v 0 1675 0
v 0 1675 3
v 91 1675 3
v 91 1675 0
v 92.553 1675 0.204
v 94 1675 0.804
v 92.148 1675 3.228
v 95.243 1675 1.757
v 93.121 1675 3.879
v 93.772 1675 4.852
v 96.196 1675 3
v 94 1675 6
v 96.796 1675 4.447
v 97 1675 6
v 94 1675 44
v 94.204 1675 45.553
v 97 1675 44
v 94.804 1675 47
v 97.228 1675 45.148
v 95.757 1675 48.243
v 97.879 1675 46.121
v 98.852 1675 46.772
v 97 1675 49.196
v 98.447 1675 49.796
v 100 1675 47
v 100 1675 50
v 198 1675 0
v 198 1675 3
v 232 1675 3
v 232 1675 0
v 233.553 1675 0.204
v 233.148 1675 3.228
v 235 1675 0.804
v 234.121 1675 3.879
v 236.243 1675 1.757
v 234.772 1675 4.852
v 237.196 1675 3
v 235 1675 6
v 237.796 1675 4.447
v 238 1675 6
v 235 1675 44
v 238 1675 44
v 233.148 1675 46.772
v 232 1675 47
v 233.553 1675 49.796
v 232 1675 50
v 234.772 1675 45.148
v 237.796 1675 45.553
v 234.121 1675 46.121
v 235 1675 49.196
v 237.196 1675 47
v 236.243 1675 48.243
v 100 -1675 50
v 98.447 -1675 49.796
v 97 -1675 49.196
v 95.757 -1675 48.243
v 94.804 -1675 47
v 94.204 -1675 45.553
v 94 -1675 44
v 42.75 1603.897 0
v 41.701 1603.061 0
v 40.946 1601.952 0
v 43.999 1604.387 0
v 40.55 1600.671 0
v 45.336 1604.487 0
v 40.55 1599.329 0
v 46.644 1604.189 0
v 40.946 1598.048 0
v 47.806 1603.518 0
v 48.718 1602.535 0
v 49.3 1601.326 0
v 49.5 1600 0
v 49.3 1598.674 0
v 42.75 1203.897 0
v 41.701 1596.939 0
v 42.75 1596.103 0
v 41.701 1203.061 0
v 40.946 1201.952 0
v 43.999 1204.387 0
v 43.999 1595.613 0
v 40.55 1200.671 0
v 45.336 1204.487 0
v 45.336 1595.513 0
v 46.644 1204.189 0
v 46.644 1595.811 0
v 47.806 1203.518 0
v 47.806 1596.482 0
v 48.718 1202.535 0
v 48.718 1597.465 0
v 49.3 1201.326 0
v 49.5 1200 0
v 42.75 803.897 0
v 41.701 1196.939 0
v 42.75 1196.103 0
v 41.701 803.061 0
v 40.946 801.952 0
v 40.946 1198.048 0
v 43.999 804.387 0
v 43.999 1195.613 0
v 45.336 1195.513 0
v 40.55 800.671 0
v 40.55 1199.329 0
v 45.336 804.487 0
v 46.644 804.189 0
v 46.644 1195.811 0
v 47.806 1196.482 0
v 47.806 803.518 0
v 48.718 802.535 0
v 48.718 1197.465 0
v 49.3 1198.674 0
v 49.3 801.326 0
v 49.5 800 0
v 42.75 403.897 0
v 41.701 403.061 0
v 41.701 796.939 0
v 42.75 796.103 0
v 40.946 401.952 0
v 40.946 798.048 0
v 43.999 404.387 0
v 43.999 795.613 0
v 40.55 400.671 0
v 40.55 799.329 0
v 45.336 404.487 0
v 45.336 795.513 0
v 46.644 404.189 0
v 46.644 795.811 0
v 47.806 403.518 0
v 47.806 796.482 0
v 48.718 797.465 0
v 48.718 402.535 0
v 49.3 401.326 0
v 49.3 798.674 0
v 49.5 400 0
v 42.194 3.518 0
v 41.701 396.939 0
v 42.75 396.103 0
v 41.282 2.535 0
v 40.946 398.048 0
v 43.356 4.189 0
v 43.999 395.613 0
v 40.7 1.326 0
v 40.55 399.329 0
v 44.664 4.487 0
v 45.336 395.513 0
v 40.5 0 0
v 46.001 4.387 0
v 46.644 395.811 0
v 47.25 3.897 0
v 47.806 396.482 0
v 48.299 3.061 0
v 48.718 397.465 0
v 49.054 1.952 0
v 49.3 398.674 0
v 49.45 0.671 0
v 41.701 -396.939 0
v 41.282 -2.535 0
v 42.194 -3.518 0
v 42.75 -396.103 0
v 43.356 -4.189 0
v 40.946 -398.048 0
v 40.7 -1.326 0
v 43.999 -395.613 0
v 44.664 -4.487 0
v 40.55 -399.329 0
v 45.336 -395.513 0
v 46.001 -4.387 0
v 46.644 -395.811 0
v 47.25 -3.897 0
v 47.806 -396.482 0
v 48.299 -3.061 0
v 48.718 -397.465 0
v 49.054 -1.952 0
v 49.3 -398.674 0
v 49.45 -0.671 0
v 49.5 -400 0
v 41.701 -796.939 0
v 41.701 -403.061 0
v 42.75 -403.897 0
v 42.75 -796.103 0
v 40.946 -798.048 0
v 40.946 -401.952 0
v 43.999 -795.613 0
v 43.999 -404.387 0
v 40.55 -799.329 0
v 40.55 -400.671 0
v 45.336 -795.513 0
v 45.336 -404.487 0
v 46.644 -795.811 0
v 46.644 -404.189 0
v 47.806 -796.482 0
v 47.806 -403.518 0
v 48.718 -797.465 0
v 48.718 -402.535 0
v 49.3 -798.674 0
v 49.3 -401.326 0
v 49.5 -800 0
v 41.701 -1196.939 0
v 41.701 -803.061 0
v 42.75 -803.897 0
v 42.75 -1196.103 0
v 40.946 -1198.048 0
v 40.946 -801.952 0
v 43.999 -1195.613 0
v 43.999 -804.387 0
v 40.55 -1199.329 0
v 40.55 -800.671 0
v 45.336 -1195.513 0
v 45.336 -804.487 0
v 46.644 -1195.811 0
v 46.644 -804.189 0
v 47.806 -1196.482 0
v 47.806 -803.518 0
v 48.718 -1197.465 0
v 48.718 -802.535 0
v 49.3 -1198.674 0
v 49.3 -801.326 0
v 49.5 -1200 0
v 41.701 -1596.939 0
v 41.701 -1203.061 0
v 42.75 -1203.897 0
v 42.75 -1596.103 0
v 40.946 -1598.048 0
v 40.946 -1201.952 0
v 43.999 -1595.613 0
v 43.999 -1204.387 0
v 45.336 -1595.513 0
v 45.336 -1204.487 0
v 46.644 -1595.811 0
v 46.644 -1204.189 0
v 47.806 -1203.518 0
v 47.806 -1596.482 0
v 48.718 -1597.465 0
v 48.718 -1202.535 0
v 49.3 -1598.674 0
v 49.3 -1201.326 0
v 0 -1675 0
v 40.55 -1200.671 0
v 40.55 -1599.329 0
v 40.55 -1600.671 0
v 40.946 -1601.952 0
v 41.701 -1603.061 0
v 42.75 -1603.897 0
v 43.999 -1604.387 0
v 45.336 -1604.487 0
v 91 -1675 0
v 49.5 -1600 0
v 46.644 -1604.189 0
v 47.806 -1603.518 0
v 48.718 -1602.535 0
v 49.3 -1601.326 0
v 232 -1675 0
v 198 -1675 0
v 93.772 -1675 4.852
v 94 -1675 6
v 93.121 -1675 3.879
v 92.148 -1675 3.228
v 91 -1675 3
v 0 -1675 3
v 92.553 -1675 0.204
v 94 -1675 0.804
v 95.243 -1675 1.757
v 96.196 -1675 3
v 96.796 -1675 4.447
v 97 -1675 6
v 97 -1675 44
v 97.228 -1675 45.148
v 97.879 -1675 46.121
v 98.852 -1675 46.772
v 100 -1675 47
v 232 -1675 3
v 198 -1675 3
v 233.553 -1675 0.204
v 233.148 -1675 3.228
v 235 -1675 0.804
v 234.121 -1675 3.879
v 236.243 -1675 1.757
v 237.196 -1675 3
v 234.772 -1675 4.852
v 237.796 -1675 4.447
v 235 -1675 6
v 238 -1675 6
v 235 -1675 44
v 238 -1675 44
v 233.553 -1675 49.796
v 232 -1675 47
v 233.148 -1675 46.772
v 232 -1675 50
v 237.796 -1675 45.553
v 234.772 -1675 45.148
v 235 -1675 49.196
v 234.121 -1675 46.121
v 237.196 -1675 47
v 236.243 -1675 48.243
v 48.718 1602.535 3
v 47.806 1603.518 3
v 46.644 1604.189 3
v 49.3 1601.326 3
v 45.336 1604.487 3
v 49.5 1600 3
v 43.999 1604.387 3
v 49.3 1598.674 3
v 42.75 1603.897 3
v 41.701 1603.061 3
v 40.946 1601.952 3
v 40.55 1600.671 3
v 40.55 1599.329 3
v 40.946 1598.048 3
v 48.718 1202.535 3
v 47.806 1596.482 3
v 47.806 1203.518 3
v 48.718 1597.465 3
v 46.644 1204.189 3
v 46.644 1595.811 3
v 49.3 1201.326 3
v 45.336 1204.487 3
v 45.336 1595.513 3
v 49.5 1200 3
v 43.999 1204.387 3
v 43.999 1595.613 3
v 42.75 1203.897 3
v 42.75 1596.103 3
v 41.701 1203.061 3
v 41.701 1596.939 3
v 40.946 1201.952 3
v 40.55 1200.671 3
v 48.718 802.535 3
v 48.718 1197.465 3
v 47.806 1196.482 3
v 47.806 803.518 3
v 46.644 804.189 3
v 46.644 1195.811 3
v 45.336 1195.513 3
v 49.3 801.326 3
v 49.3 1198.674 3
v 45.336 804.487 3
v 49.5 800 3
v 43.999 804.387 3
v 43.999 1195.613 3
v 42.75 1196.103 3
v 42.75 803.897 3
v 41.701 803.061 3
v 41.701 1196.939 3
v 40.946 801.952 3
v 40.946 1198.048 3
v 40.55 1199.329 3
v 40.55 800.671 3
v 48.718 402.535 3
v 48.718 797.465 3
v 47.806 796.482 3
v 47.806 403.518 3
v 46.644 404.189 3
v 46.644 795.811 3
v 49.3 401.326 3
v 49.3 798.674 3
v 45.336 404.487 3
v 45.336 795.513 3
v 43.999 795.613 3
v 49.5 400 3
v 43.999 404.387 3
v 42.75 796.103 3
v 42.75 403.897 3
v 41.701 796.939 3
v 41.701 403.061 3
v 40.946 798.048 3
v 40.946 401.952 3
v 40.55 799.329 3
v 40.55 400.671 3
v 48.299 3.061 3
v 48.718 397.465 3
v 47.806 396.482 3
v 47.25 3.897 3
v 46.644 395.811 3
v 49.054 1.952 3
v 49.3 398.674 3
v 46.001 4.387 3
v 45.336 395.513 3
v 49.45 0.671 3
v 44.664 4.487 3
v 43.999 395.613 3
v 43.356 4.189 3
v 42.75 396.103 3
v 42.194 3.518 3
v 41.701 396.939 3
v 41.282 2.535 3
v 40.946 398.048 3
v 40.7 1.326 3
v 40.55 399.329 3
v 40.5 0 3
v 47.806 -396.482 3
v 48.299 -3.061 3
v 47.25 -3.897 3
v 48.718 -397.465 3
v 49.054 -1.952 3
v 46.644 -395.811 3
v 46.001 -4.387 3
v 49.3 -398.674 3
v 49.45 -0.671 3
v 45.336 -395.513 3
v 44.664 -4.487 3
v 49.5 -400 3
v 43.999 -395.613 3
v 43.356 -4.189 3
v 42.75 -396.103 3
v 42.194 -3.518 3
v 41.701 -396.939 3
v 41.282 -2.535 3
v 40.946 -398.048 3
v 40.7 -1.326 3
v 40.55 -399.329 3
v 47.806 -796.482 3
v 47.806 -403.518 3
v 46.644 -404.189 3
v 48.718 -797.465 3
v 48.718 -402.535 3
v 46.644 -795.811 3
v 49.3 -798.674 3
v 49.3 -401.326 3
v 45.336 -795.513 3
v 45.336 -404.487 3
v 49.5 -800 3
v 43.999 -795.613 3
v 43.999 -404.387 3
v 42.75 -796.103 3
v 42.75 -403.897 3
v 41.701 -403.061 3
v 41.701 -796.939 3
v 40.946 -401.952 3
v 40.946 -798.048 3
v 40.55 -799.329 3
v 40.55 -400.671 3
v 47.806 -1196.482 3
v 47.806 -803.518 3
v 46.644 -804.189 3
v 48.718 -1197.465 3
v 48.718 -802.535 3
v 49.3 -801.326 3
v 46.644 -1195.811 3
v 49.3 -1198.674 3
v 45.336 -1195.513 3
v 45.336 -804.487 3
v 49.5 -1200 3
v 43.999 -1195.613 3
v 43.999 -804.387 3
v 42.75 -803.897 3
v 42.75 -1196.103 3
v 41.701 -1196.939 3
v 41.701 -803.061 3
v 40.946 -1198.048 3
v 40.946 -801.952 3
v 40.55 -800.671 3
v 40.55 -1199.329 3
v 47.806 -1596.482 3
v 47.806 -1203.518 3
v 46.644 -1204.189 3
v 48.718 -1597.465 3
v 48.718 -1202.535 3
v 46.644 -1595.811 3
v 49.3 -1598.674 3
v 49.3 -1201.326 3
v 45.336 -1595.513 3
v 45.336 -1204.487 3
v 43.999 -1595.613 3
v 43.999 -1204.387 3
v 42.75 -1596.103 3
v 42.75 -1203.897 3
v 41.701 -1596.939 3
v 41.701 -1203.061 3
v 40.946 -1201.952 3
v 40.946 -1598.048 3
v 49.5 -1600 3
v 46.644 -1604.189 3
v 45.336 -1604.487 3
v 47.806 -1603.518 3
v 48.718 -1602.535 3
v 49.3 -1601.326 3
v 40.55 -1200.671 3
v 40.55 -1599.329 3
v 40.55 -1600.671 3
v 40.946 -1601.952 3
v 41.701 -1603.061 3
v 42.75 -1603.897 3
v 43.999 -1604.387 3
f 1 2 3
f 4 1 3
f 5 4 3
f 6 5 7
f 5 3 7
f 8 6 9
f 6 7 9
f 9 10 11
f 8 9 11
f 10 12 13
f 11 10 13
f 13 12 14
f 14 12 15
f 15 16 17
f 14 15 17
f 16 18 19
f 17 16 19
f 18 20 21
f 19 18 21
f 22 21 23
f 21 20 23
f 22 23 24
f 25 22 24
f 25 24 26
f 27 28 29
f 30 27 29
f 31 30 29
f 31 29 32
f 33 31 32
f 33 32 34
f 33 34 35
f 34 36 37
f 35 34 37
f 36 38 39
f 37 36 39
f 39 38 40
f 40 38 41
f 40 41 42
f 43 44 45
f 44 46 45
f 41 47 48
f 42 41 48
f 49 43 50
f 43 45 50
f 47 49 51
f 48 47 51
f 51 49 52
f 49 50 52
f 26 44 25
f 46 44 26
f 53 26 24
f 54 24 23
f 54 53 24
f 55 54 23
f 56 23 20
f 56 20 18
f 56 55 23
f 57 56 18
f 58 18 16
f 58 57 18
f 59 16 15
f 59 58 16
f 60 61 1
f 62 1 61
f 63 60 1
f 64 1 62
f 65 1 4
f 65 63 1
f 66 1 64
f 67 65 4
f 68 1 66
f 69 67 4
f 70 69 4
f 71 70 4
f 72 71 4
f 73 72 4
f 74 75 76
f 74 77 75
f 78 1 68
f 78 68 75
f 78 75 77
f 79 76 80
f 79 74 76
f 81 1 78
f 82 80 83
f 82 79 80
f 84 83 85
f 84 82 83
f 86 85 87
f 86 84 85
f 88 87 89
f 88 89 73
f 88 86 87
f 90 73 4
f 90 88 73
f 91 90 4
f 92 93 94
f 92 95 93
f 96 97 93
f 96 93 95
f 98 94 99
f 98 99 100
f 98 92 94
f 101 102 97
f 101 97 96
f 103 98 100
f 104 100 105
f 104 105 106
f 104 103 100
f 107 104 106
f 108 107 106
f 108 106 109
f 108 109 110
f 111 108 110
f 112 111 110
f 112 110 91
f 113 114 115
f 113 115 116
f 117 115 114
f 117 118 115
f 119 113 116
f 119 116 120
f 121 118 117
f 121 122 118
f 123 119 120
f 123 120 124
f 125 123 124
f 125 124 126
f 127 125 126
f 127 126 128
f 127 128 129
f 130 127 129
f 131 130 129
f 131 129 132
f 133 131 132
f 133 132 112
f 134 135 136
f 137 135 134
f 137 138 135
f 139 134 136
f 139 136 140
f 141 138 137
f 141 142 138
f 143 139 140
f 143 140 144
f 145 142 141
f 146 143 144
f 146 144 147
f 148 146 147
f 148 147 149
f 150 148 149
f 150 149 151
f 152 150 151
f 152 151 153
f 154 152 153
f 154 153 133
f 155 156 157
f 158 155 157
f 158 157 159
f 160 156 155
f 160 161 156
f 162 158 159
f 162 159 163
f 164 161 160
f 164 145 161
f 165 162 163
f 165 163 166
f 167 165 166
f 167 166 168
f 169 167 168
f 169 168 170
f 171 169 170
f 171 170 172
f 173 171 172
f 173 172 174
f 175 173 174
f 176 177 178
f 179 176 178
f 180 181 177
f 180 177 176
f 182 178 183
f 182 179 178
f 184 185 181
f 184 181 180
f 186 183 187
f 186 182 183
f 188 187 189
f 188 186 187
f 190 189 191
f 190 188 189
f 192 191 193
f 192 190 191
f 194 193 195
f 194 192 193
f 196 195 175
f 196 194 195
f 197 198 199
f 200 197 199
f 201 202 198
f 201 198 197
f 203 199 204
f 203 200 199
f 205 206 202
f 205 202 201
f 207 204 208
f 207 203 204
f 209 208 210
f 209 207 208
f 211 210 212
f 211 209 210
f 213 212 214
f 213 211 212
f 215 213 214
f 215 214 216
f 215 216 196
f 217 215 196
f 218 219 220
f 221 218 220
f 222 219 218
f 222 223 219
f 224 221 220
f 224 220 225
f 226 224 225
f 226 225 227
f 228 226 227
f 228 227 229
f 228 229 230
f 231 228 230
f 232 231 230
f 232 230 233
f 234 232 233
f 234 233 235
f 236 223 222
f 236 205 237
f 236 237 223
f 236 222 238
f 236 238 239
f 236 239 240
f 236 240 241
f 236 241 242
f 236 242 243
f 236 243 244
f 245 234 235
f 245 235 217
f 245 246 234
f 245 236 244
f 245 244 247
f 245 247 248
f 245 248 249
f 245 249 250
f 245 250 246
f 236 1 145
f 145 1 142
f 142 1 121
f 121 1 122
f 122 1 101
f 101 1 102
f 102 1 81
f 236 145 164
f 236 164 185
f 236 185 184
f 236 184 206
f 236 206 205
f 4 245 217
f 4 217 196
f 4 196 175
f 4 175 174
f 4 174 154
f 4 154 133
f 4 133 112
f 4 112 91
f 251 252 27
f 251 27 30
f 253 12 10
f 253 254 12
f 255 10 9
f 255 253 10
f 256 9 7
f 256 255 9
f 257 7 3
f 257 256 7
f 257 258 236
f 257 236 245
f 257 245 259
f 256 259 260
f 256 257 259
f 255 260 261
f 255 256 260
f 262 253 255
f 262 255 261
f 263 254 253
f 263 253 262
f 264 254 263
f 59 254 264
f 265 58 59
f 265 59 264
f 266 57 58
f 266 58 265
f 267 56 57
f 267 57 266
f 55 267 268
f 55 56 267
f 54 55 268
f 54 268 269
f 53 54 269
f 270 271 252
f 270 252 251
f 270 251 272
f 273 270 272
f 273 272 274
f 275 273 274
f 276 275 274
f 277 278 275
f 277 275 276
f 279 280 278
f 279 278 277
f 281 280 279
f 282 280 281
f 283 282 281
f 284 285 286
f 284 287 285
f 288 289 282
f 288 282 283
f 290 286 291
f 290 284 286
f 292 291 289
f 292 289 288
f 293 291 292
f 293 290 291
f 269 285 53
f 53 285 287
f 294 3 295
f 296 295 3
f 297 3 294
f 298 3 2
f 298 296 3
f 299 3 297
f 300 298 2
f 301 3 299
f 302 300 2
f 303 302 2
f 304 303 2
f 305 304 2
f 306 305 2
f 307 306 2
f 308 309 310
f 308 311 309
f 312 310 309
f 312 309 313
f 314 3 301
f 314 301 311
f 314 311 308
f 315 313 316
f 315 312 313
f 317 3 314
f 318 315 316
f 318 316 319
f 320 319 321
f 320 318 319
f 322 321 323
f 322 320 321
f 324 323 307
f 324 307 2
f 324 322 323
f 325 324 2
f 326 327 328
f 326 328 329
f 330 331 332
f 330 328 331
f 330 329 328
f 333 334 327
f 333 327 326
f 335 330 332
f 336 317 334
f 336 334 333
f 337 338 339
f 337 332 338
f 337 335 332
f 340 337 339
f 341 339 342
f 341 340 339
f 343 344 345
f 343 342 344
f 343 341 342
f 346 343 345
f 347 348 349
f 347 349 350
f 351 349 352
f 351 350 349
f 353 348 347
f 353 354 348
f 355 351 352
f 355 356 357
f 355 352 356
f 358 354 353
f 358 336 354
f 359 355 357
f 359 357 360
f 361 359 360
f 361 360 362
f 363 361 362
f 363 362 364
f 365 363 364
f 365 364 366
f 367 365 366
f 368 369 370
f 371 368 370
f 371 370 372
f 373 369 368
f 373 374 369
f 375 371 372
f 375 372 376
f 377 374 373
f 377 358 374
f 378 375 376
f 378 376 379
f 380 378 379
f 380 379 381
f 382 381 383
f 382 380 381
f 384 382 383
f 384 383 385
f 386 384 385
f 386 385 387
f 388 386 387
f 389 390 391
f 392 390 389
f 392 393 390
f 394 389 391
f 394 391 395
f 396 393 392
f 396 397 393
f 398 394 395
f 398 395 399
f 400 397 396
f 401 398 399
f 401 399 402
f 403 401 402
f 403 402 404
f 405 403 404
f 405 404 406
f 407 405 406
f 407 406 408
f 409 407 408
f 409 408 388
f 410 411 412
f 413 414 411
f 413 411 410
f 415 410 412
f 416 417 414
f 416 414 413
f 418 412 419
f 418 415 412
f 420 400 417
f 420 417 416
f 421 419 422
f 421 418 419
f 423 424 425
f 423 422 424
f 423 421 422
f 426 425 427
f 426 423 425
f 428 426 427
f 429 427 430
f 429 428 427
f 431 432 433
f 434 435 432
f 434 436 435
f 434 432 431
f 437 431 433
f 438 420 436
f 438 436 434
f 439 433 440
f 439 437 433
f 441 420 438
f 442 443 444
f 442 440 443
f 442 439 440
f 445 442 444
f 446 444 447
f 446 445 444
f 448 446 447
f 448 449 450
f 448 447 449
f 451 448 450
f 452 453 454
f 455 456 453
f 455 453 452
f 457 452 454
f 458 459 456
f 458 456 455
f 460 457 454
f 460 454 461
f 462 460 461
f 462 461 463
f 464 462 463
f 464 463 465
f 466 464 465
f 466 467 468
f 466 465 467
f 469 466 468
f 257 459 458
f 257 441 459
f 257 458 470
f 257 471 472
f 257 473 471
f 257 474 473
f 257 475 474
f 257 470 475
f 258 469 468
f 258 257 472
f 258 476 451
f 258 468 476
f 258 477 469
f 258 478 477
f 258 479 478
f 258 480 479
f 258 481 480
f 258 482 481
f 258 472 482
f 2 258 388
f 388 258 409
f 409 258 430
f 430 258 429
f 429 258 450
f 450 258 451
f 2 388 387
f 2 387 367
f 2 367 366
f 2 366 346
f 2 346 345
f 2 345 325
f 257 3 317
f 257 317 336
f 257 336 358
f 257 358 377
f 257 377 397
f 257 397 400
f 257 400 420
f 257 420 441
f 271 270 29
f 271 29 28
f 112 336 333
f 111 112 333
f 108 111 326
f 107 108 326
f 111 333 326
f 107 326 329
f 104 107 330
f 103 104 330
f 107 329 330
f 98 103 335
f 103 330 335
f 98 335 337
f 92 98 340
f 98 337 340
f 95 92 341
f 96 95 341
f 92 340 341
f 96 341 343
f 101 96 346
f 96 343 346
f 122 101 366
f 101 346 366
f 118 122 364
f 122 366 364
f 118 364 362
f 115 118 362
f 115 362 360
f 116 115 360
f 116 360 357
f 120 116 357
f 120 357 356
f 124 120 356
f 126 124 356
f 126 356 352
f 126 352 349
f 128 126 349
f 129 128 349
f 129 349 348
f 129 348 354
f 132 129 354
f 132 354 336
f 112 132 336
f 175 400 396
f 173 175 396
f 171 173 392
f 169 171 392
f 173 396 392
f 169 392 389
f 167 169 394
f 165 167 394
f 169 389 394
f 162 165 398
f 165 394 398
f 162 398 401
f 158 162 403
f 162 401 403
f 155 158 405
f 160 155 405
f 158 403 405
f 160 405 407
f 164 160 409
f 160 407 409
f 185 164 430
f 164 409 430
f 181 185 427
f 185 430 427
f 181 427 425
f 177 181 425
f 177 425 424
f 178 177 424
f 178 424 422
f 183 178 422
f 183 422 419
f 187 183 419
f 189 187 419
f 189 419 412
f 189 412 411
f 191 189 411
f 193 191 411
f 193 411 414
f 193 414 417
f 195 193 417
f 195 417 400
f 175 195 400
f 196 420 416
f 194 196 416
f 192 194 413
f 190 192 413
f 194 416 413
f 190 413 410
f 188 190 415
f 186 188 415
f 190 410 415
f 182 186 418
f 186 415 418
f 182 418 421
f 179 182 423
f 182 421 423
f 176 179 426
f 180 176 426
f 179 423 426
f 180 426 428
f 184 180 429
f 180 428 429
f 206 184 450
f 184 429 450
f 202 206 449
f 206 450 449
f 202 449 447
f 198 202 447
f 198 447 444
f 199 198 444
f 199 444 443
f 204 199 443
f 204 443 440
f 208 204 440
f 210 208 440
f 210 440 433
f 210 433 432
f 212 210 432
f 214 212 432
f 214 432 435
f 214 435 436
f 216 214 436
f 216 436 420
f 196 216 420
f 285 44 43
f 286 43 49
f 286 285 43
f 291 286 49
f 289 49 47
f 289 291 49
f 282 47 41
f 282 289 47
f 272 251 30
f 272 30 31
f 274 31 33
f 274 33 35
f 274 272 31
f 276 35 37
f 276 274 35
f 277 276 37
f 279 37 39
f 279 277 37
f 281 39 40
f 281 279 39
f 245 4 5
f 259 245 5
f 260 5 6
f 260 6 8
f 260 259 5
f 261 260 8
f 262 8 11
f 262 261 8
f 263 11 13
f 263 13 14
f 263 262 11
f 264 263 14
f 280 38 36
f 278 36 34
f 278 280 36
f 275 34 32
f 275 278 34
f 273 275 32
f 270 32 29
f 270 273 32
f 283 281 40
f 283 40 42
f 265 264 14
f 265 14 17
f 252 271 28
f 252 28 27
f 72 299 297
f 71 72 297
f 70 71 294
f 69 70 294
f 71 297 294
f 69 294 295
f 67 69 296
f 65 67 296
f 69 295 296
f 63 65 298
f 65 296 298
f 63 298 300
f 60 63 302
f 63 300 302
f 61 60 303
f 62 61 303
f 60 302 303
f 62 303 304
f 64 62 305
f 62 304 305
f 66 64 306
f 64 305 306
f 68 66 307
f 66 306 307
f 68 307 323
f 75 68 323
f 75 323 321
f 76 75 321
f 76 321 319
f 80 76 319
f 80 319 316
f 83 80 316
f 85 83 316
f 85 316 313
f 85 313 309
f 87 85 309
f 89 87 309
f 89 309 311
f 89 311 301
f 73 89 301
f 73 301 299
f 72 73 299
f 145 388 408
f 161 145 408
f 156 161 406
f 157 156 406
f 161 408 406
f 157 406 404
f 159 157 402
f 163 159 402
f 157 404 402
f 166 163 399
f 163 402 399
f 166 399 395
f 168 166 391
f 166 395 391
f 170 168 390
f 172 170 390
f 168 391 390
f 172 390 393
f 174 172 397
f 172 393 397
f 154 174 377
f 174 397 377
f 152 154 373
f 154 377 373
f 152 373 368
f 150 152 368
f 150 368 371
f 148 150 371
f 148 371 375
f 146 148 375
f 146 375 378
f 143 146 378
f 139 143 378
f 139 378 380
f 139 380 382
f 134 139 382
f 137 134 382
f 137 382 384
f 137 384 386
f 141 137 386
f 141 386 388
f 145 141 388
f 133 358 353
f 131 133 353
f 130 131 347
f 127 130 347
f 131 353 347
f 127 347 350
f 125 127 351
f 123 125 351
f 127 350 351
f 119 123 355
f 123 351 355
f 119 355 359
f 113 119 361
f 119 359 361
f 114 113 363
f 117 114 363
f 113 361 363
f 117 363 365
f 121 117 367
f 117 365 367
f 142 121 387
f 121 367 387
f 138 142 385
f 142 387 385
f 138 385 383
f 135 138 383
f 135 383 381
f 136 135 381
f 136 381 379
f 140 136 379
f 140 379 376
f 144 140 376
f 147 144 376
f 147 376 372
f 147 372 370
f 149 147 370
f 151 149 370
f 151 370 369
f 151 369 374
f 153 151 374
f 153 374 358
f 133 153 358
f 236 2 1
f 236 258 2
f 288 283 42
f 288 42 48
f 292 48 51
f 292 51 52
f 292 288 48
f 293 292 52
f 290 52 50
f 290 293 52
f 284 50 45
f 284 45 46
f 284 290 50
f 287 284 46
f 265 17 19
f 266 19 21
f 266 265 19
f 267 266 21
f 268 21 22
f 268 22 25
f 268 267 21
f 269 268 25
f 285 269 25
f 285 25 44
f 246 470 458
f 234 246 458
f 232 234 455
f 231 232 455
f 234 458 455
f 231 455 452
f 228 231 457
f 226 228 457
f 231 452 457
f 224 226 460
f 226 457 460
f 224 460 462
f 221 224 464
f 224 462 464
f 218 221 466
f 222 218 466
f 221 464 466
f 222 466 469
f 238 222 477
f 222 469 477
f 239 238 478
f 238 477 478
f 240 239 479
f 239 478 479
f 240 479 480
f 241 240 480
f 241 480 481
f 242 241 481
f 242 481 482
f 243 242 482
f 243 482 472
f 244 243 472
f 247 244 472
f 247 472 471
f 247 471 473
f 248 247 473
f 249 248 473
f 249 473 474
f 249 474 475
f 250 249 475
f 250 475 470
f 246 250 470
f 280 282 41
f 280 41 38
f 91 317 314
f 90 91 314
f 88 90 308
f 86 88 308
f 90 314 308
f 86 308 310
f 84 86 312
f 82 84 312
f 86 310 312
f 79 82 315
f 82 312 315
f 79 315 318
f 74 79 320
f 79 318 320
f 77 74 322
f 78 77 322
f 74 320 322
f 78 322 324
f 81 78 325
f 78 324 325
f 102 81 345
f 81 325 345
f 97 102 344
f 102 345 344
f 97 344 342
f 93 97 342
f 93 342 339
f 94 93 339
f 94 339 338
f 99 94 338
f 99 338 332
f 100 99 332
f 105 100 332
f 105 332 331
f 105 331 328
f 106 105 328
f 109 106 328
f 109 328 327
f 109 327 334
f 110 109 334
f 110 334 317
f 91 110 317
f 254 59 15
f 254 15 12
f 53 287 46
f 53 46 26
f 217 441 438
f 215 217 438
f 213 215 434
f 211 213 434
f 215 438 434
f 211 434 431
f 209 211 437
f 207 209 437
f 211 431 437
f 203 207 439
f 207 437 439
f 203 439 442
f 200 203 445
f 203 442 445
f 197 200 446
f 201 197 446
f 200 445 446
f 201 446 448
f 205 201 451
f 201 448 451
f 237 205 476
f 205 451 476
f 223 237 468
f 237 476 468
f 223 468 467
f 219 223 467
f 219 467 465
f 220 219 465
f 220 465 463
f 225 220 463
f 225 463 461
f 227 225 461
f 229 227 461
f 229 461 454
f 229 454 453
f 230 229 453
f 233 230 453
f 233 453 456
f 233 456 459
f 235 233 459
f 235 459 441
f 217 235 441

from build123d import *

# Parameters (mm, degrees)
F1_DEPTH   = 1675
F2_R       = 4.5
F1_FACE1_W = 91
F1_FACE1_H = 3350
F3_DEPTH   = 25


with BuildPart() as f1:
    # F0 (on Front) → F1 (new body, symmetric)
    with BuildSketch(Plane.XZ):
        with BuildLine():
            Line((0, 3), (0, 0))
            Line((0, 0), (91, 0))
            ThreePointArc((91, 0), (95.2426406871, 1.7573593129), (97, 6))
            Line((97, 6), (97, 44))
            ThreePointArc((97, 44), (97.8786796564, 46.1213203436), (100, 47))
            Line((100, 47), (232, 47))
            ThreePointArc((232, 47), (234.1213203436, 46.1213203436), (235, 44))
            Line((235, 44), (235, 6))
            ThreePointArc((235, 6), (234.1213203436, 3.8786796564), (232, 3))
            Line((232, 3), (198, 3))
            Line((198, 3), (198, 0))
            Line((198, 0), (232, 0))
            ThreePointArc((232, 0), (236.2426406871, 1.7573593129), (238, 6))
            Line((238, 6), (238, 44))
            ThreePointArc((238, 44), (236.2426406871, 48.2426406871), (232, 50))
            Line((232, 50), (100, 50))
            ThreePointArc((100, 50), (95.7573593129, 48.2426406871), (94, 44))
            Line((94, 44), (94, 6))
            ThreePointArc((94, 6), (93.1213203436, 3.8786796564), (91, 3))
            Line((91, 3), (0, 3))
        make_face()
    extrude(amount=F1_DEPTH, both=True)

    # F2 (on face) + F1_face1 (on face) → F3 (cut)
    with BuildSketch(Plane.XY.offset(3)):
        with BuildLine():
            ThreePointArc((49.5, 0), (45, 4.5), (40.5, 0))
            Line((40.5, 0), (49.5, 0))
        make_face()
        with BuildLine():
            Line((49.5, 0), (40.5, 0))
            ThreePointArc((40.5, 0), (45, -4.5), (49.5, 0))
        make_face()
        with Locations((45, -400)):
            Circle(F2_R)
        with Locations((45, -800)):
            Circle(F2_R)
        with Locations((45, -1200)):
            Circle(F2_R)
        with Locations((45, -1600)):
            Circle(F2_R)
        with Locations((45, 400)):
            Circle(F2_R)
        with Locations((45, 800)):
            Circle(F2_R)
        with Locations((45, 1200)):
            Circle(F2_R)
        with Locations((45, 1600)):
            Circle(F2_R)
    with BuildSketch(Plane(origin=(45.5, 0, 0), x_dir=(1, 0, 0), z_dir=(0, 0, -1))):
        Rectangle(F1_FACE1_W, F1_FACE1_H)
    extrude(amount=-F3_DEPTH, dir=(0, 0, 1), mode=Mode.SUBTRACT)


solid = f1.part
